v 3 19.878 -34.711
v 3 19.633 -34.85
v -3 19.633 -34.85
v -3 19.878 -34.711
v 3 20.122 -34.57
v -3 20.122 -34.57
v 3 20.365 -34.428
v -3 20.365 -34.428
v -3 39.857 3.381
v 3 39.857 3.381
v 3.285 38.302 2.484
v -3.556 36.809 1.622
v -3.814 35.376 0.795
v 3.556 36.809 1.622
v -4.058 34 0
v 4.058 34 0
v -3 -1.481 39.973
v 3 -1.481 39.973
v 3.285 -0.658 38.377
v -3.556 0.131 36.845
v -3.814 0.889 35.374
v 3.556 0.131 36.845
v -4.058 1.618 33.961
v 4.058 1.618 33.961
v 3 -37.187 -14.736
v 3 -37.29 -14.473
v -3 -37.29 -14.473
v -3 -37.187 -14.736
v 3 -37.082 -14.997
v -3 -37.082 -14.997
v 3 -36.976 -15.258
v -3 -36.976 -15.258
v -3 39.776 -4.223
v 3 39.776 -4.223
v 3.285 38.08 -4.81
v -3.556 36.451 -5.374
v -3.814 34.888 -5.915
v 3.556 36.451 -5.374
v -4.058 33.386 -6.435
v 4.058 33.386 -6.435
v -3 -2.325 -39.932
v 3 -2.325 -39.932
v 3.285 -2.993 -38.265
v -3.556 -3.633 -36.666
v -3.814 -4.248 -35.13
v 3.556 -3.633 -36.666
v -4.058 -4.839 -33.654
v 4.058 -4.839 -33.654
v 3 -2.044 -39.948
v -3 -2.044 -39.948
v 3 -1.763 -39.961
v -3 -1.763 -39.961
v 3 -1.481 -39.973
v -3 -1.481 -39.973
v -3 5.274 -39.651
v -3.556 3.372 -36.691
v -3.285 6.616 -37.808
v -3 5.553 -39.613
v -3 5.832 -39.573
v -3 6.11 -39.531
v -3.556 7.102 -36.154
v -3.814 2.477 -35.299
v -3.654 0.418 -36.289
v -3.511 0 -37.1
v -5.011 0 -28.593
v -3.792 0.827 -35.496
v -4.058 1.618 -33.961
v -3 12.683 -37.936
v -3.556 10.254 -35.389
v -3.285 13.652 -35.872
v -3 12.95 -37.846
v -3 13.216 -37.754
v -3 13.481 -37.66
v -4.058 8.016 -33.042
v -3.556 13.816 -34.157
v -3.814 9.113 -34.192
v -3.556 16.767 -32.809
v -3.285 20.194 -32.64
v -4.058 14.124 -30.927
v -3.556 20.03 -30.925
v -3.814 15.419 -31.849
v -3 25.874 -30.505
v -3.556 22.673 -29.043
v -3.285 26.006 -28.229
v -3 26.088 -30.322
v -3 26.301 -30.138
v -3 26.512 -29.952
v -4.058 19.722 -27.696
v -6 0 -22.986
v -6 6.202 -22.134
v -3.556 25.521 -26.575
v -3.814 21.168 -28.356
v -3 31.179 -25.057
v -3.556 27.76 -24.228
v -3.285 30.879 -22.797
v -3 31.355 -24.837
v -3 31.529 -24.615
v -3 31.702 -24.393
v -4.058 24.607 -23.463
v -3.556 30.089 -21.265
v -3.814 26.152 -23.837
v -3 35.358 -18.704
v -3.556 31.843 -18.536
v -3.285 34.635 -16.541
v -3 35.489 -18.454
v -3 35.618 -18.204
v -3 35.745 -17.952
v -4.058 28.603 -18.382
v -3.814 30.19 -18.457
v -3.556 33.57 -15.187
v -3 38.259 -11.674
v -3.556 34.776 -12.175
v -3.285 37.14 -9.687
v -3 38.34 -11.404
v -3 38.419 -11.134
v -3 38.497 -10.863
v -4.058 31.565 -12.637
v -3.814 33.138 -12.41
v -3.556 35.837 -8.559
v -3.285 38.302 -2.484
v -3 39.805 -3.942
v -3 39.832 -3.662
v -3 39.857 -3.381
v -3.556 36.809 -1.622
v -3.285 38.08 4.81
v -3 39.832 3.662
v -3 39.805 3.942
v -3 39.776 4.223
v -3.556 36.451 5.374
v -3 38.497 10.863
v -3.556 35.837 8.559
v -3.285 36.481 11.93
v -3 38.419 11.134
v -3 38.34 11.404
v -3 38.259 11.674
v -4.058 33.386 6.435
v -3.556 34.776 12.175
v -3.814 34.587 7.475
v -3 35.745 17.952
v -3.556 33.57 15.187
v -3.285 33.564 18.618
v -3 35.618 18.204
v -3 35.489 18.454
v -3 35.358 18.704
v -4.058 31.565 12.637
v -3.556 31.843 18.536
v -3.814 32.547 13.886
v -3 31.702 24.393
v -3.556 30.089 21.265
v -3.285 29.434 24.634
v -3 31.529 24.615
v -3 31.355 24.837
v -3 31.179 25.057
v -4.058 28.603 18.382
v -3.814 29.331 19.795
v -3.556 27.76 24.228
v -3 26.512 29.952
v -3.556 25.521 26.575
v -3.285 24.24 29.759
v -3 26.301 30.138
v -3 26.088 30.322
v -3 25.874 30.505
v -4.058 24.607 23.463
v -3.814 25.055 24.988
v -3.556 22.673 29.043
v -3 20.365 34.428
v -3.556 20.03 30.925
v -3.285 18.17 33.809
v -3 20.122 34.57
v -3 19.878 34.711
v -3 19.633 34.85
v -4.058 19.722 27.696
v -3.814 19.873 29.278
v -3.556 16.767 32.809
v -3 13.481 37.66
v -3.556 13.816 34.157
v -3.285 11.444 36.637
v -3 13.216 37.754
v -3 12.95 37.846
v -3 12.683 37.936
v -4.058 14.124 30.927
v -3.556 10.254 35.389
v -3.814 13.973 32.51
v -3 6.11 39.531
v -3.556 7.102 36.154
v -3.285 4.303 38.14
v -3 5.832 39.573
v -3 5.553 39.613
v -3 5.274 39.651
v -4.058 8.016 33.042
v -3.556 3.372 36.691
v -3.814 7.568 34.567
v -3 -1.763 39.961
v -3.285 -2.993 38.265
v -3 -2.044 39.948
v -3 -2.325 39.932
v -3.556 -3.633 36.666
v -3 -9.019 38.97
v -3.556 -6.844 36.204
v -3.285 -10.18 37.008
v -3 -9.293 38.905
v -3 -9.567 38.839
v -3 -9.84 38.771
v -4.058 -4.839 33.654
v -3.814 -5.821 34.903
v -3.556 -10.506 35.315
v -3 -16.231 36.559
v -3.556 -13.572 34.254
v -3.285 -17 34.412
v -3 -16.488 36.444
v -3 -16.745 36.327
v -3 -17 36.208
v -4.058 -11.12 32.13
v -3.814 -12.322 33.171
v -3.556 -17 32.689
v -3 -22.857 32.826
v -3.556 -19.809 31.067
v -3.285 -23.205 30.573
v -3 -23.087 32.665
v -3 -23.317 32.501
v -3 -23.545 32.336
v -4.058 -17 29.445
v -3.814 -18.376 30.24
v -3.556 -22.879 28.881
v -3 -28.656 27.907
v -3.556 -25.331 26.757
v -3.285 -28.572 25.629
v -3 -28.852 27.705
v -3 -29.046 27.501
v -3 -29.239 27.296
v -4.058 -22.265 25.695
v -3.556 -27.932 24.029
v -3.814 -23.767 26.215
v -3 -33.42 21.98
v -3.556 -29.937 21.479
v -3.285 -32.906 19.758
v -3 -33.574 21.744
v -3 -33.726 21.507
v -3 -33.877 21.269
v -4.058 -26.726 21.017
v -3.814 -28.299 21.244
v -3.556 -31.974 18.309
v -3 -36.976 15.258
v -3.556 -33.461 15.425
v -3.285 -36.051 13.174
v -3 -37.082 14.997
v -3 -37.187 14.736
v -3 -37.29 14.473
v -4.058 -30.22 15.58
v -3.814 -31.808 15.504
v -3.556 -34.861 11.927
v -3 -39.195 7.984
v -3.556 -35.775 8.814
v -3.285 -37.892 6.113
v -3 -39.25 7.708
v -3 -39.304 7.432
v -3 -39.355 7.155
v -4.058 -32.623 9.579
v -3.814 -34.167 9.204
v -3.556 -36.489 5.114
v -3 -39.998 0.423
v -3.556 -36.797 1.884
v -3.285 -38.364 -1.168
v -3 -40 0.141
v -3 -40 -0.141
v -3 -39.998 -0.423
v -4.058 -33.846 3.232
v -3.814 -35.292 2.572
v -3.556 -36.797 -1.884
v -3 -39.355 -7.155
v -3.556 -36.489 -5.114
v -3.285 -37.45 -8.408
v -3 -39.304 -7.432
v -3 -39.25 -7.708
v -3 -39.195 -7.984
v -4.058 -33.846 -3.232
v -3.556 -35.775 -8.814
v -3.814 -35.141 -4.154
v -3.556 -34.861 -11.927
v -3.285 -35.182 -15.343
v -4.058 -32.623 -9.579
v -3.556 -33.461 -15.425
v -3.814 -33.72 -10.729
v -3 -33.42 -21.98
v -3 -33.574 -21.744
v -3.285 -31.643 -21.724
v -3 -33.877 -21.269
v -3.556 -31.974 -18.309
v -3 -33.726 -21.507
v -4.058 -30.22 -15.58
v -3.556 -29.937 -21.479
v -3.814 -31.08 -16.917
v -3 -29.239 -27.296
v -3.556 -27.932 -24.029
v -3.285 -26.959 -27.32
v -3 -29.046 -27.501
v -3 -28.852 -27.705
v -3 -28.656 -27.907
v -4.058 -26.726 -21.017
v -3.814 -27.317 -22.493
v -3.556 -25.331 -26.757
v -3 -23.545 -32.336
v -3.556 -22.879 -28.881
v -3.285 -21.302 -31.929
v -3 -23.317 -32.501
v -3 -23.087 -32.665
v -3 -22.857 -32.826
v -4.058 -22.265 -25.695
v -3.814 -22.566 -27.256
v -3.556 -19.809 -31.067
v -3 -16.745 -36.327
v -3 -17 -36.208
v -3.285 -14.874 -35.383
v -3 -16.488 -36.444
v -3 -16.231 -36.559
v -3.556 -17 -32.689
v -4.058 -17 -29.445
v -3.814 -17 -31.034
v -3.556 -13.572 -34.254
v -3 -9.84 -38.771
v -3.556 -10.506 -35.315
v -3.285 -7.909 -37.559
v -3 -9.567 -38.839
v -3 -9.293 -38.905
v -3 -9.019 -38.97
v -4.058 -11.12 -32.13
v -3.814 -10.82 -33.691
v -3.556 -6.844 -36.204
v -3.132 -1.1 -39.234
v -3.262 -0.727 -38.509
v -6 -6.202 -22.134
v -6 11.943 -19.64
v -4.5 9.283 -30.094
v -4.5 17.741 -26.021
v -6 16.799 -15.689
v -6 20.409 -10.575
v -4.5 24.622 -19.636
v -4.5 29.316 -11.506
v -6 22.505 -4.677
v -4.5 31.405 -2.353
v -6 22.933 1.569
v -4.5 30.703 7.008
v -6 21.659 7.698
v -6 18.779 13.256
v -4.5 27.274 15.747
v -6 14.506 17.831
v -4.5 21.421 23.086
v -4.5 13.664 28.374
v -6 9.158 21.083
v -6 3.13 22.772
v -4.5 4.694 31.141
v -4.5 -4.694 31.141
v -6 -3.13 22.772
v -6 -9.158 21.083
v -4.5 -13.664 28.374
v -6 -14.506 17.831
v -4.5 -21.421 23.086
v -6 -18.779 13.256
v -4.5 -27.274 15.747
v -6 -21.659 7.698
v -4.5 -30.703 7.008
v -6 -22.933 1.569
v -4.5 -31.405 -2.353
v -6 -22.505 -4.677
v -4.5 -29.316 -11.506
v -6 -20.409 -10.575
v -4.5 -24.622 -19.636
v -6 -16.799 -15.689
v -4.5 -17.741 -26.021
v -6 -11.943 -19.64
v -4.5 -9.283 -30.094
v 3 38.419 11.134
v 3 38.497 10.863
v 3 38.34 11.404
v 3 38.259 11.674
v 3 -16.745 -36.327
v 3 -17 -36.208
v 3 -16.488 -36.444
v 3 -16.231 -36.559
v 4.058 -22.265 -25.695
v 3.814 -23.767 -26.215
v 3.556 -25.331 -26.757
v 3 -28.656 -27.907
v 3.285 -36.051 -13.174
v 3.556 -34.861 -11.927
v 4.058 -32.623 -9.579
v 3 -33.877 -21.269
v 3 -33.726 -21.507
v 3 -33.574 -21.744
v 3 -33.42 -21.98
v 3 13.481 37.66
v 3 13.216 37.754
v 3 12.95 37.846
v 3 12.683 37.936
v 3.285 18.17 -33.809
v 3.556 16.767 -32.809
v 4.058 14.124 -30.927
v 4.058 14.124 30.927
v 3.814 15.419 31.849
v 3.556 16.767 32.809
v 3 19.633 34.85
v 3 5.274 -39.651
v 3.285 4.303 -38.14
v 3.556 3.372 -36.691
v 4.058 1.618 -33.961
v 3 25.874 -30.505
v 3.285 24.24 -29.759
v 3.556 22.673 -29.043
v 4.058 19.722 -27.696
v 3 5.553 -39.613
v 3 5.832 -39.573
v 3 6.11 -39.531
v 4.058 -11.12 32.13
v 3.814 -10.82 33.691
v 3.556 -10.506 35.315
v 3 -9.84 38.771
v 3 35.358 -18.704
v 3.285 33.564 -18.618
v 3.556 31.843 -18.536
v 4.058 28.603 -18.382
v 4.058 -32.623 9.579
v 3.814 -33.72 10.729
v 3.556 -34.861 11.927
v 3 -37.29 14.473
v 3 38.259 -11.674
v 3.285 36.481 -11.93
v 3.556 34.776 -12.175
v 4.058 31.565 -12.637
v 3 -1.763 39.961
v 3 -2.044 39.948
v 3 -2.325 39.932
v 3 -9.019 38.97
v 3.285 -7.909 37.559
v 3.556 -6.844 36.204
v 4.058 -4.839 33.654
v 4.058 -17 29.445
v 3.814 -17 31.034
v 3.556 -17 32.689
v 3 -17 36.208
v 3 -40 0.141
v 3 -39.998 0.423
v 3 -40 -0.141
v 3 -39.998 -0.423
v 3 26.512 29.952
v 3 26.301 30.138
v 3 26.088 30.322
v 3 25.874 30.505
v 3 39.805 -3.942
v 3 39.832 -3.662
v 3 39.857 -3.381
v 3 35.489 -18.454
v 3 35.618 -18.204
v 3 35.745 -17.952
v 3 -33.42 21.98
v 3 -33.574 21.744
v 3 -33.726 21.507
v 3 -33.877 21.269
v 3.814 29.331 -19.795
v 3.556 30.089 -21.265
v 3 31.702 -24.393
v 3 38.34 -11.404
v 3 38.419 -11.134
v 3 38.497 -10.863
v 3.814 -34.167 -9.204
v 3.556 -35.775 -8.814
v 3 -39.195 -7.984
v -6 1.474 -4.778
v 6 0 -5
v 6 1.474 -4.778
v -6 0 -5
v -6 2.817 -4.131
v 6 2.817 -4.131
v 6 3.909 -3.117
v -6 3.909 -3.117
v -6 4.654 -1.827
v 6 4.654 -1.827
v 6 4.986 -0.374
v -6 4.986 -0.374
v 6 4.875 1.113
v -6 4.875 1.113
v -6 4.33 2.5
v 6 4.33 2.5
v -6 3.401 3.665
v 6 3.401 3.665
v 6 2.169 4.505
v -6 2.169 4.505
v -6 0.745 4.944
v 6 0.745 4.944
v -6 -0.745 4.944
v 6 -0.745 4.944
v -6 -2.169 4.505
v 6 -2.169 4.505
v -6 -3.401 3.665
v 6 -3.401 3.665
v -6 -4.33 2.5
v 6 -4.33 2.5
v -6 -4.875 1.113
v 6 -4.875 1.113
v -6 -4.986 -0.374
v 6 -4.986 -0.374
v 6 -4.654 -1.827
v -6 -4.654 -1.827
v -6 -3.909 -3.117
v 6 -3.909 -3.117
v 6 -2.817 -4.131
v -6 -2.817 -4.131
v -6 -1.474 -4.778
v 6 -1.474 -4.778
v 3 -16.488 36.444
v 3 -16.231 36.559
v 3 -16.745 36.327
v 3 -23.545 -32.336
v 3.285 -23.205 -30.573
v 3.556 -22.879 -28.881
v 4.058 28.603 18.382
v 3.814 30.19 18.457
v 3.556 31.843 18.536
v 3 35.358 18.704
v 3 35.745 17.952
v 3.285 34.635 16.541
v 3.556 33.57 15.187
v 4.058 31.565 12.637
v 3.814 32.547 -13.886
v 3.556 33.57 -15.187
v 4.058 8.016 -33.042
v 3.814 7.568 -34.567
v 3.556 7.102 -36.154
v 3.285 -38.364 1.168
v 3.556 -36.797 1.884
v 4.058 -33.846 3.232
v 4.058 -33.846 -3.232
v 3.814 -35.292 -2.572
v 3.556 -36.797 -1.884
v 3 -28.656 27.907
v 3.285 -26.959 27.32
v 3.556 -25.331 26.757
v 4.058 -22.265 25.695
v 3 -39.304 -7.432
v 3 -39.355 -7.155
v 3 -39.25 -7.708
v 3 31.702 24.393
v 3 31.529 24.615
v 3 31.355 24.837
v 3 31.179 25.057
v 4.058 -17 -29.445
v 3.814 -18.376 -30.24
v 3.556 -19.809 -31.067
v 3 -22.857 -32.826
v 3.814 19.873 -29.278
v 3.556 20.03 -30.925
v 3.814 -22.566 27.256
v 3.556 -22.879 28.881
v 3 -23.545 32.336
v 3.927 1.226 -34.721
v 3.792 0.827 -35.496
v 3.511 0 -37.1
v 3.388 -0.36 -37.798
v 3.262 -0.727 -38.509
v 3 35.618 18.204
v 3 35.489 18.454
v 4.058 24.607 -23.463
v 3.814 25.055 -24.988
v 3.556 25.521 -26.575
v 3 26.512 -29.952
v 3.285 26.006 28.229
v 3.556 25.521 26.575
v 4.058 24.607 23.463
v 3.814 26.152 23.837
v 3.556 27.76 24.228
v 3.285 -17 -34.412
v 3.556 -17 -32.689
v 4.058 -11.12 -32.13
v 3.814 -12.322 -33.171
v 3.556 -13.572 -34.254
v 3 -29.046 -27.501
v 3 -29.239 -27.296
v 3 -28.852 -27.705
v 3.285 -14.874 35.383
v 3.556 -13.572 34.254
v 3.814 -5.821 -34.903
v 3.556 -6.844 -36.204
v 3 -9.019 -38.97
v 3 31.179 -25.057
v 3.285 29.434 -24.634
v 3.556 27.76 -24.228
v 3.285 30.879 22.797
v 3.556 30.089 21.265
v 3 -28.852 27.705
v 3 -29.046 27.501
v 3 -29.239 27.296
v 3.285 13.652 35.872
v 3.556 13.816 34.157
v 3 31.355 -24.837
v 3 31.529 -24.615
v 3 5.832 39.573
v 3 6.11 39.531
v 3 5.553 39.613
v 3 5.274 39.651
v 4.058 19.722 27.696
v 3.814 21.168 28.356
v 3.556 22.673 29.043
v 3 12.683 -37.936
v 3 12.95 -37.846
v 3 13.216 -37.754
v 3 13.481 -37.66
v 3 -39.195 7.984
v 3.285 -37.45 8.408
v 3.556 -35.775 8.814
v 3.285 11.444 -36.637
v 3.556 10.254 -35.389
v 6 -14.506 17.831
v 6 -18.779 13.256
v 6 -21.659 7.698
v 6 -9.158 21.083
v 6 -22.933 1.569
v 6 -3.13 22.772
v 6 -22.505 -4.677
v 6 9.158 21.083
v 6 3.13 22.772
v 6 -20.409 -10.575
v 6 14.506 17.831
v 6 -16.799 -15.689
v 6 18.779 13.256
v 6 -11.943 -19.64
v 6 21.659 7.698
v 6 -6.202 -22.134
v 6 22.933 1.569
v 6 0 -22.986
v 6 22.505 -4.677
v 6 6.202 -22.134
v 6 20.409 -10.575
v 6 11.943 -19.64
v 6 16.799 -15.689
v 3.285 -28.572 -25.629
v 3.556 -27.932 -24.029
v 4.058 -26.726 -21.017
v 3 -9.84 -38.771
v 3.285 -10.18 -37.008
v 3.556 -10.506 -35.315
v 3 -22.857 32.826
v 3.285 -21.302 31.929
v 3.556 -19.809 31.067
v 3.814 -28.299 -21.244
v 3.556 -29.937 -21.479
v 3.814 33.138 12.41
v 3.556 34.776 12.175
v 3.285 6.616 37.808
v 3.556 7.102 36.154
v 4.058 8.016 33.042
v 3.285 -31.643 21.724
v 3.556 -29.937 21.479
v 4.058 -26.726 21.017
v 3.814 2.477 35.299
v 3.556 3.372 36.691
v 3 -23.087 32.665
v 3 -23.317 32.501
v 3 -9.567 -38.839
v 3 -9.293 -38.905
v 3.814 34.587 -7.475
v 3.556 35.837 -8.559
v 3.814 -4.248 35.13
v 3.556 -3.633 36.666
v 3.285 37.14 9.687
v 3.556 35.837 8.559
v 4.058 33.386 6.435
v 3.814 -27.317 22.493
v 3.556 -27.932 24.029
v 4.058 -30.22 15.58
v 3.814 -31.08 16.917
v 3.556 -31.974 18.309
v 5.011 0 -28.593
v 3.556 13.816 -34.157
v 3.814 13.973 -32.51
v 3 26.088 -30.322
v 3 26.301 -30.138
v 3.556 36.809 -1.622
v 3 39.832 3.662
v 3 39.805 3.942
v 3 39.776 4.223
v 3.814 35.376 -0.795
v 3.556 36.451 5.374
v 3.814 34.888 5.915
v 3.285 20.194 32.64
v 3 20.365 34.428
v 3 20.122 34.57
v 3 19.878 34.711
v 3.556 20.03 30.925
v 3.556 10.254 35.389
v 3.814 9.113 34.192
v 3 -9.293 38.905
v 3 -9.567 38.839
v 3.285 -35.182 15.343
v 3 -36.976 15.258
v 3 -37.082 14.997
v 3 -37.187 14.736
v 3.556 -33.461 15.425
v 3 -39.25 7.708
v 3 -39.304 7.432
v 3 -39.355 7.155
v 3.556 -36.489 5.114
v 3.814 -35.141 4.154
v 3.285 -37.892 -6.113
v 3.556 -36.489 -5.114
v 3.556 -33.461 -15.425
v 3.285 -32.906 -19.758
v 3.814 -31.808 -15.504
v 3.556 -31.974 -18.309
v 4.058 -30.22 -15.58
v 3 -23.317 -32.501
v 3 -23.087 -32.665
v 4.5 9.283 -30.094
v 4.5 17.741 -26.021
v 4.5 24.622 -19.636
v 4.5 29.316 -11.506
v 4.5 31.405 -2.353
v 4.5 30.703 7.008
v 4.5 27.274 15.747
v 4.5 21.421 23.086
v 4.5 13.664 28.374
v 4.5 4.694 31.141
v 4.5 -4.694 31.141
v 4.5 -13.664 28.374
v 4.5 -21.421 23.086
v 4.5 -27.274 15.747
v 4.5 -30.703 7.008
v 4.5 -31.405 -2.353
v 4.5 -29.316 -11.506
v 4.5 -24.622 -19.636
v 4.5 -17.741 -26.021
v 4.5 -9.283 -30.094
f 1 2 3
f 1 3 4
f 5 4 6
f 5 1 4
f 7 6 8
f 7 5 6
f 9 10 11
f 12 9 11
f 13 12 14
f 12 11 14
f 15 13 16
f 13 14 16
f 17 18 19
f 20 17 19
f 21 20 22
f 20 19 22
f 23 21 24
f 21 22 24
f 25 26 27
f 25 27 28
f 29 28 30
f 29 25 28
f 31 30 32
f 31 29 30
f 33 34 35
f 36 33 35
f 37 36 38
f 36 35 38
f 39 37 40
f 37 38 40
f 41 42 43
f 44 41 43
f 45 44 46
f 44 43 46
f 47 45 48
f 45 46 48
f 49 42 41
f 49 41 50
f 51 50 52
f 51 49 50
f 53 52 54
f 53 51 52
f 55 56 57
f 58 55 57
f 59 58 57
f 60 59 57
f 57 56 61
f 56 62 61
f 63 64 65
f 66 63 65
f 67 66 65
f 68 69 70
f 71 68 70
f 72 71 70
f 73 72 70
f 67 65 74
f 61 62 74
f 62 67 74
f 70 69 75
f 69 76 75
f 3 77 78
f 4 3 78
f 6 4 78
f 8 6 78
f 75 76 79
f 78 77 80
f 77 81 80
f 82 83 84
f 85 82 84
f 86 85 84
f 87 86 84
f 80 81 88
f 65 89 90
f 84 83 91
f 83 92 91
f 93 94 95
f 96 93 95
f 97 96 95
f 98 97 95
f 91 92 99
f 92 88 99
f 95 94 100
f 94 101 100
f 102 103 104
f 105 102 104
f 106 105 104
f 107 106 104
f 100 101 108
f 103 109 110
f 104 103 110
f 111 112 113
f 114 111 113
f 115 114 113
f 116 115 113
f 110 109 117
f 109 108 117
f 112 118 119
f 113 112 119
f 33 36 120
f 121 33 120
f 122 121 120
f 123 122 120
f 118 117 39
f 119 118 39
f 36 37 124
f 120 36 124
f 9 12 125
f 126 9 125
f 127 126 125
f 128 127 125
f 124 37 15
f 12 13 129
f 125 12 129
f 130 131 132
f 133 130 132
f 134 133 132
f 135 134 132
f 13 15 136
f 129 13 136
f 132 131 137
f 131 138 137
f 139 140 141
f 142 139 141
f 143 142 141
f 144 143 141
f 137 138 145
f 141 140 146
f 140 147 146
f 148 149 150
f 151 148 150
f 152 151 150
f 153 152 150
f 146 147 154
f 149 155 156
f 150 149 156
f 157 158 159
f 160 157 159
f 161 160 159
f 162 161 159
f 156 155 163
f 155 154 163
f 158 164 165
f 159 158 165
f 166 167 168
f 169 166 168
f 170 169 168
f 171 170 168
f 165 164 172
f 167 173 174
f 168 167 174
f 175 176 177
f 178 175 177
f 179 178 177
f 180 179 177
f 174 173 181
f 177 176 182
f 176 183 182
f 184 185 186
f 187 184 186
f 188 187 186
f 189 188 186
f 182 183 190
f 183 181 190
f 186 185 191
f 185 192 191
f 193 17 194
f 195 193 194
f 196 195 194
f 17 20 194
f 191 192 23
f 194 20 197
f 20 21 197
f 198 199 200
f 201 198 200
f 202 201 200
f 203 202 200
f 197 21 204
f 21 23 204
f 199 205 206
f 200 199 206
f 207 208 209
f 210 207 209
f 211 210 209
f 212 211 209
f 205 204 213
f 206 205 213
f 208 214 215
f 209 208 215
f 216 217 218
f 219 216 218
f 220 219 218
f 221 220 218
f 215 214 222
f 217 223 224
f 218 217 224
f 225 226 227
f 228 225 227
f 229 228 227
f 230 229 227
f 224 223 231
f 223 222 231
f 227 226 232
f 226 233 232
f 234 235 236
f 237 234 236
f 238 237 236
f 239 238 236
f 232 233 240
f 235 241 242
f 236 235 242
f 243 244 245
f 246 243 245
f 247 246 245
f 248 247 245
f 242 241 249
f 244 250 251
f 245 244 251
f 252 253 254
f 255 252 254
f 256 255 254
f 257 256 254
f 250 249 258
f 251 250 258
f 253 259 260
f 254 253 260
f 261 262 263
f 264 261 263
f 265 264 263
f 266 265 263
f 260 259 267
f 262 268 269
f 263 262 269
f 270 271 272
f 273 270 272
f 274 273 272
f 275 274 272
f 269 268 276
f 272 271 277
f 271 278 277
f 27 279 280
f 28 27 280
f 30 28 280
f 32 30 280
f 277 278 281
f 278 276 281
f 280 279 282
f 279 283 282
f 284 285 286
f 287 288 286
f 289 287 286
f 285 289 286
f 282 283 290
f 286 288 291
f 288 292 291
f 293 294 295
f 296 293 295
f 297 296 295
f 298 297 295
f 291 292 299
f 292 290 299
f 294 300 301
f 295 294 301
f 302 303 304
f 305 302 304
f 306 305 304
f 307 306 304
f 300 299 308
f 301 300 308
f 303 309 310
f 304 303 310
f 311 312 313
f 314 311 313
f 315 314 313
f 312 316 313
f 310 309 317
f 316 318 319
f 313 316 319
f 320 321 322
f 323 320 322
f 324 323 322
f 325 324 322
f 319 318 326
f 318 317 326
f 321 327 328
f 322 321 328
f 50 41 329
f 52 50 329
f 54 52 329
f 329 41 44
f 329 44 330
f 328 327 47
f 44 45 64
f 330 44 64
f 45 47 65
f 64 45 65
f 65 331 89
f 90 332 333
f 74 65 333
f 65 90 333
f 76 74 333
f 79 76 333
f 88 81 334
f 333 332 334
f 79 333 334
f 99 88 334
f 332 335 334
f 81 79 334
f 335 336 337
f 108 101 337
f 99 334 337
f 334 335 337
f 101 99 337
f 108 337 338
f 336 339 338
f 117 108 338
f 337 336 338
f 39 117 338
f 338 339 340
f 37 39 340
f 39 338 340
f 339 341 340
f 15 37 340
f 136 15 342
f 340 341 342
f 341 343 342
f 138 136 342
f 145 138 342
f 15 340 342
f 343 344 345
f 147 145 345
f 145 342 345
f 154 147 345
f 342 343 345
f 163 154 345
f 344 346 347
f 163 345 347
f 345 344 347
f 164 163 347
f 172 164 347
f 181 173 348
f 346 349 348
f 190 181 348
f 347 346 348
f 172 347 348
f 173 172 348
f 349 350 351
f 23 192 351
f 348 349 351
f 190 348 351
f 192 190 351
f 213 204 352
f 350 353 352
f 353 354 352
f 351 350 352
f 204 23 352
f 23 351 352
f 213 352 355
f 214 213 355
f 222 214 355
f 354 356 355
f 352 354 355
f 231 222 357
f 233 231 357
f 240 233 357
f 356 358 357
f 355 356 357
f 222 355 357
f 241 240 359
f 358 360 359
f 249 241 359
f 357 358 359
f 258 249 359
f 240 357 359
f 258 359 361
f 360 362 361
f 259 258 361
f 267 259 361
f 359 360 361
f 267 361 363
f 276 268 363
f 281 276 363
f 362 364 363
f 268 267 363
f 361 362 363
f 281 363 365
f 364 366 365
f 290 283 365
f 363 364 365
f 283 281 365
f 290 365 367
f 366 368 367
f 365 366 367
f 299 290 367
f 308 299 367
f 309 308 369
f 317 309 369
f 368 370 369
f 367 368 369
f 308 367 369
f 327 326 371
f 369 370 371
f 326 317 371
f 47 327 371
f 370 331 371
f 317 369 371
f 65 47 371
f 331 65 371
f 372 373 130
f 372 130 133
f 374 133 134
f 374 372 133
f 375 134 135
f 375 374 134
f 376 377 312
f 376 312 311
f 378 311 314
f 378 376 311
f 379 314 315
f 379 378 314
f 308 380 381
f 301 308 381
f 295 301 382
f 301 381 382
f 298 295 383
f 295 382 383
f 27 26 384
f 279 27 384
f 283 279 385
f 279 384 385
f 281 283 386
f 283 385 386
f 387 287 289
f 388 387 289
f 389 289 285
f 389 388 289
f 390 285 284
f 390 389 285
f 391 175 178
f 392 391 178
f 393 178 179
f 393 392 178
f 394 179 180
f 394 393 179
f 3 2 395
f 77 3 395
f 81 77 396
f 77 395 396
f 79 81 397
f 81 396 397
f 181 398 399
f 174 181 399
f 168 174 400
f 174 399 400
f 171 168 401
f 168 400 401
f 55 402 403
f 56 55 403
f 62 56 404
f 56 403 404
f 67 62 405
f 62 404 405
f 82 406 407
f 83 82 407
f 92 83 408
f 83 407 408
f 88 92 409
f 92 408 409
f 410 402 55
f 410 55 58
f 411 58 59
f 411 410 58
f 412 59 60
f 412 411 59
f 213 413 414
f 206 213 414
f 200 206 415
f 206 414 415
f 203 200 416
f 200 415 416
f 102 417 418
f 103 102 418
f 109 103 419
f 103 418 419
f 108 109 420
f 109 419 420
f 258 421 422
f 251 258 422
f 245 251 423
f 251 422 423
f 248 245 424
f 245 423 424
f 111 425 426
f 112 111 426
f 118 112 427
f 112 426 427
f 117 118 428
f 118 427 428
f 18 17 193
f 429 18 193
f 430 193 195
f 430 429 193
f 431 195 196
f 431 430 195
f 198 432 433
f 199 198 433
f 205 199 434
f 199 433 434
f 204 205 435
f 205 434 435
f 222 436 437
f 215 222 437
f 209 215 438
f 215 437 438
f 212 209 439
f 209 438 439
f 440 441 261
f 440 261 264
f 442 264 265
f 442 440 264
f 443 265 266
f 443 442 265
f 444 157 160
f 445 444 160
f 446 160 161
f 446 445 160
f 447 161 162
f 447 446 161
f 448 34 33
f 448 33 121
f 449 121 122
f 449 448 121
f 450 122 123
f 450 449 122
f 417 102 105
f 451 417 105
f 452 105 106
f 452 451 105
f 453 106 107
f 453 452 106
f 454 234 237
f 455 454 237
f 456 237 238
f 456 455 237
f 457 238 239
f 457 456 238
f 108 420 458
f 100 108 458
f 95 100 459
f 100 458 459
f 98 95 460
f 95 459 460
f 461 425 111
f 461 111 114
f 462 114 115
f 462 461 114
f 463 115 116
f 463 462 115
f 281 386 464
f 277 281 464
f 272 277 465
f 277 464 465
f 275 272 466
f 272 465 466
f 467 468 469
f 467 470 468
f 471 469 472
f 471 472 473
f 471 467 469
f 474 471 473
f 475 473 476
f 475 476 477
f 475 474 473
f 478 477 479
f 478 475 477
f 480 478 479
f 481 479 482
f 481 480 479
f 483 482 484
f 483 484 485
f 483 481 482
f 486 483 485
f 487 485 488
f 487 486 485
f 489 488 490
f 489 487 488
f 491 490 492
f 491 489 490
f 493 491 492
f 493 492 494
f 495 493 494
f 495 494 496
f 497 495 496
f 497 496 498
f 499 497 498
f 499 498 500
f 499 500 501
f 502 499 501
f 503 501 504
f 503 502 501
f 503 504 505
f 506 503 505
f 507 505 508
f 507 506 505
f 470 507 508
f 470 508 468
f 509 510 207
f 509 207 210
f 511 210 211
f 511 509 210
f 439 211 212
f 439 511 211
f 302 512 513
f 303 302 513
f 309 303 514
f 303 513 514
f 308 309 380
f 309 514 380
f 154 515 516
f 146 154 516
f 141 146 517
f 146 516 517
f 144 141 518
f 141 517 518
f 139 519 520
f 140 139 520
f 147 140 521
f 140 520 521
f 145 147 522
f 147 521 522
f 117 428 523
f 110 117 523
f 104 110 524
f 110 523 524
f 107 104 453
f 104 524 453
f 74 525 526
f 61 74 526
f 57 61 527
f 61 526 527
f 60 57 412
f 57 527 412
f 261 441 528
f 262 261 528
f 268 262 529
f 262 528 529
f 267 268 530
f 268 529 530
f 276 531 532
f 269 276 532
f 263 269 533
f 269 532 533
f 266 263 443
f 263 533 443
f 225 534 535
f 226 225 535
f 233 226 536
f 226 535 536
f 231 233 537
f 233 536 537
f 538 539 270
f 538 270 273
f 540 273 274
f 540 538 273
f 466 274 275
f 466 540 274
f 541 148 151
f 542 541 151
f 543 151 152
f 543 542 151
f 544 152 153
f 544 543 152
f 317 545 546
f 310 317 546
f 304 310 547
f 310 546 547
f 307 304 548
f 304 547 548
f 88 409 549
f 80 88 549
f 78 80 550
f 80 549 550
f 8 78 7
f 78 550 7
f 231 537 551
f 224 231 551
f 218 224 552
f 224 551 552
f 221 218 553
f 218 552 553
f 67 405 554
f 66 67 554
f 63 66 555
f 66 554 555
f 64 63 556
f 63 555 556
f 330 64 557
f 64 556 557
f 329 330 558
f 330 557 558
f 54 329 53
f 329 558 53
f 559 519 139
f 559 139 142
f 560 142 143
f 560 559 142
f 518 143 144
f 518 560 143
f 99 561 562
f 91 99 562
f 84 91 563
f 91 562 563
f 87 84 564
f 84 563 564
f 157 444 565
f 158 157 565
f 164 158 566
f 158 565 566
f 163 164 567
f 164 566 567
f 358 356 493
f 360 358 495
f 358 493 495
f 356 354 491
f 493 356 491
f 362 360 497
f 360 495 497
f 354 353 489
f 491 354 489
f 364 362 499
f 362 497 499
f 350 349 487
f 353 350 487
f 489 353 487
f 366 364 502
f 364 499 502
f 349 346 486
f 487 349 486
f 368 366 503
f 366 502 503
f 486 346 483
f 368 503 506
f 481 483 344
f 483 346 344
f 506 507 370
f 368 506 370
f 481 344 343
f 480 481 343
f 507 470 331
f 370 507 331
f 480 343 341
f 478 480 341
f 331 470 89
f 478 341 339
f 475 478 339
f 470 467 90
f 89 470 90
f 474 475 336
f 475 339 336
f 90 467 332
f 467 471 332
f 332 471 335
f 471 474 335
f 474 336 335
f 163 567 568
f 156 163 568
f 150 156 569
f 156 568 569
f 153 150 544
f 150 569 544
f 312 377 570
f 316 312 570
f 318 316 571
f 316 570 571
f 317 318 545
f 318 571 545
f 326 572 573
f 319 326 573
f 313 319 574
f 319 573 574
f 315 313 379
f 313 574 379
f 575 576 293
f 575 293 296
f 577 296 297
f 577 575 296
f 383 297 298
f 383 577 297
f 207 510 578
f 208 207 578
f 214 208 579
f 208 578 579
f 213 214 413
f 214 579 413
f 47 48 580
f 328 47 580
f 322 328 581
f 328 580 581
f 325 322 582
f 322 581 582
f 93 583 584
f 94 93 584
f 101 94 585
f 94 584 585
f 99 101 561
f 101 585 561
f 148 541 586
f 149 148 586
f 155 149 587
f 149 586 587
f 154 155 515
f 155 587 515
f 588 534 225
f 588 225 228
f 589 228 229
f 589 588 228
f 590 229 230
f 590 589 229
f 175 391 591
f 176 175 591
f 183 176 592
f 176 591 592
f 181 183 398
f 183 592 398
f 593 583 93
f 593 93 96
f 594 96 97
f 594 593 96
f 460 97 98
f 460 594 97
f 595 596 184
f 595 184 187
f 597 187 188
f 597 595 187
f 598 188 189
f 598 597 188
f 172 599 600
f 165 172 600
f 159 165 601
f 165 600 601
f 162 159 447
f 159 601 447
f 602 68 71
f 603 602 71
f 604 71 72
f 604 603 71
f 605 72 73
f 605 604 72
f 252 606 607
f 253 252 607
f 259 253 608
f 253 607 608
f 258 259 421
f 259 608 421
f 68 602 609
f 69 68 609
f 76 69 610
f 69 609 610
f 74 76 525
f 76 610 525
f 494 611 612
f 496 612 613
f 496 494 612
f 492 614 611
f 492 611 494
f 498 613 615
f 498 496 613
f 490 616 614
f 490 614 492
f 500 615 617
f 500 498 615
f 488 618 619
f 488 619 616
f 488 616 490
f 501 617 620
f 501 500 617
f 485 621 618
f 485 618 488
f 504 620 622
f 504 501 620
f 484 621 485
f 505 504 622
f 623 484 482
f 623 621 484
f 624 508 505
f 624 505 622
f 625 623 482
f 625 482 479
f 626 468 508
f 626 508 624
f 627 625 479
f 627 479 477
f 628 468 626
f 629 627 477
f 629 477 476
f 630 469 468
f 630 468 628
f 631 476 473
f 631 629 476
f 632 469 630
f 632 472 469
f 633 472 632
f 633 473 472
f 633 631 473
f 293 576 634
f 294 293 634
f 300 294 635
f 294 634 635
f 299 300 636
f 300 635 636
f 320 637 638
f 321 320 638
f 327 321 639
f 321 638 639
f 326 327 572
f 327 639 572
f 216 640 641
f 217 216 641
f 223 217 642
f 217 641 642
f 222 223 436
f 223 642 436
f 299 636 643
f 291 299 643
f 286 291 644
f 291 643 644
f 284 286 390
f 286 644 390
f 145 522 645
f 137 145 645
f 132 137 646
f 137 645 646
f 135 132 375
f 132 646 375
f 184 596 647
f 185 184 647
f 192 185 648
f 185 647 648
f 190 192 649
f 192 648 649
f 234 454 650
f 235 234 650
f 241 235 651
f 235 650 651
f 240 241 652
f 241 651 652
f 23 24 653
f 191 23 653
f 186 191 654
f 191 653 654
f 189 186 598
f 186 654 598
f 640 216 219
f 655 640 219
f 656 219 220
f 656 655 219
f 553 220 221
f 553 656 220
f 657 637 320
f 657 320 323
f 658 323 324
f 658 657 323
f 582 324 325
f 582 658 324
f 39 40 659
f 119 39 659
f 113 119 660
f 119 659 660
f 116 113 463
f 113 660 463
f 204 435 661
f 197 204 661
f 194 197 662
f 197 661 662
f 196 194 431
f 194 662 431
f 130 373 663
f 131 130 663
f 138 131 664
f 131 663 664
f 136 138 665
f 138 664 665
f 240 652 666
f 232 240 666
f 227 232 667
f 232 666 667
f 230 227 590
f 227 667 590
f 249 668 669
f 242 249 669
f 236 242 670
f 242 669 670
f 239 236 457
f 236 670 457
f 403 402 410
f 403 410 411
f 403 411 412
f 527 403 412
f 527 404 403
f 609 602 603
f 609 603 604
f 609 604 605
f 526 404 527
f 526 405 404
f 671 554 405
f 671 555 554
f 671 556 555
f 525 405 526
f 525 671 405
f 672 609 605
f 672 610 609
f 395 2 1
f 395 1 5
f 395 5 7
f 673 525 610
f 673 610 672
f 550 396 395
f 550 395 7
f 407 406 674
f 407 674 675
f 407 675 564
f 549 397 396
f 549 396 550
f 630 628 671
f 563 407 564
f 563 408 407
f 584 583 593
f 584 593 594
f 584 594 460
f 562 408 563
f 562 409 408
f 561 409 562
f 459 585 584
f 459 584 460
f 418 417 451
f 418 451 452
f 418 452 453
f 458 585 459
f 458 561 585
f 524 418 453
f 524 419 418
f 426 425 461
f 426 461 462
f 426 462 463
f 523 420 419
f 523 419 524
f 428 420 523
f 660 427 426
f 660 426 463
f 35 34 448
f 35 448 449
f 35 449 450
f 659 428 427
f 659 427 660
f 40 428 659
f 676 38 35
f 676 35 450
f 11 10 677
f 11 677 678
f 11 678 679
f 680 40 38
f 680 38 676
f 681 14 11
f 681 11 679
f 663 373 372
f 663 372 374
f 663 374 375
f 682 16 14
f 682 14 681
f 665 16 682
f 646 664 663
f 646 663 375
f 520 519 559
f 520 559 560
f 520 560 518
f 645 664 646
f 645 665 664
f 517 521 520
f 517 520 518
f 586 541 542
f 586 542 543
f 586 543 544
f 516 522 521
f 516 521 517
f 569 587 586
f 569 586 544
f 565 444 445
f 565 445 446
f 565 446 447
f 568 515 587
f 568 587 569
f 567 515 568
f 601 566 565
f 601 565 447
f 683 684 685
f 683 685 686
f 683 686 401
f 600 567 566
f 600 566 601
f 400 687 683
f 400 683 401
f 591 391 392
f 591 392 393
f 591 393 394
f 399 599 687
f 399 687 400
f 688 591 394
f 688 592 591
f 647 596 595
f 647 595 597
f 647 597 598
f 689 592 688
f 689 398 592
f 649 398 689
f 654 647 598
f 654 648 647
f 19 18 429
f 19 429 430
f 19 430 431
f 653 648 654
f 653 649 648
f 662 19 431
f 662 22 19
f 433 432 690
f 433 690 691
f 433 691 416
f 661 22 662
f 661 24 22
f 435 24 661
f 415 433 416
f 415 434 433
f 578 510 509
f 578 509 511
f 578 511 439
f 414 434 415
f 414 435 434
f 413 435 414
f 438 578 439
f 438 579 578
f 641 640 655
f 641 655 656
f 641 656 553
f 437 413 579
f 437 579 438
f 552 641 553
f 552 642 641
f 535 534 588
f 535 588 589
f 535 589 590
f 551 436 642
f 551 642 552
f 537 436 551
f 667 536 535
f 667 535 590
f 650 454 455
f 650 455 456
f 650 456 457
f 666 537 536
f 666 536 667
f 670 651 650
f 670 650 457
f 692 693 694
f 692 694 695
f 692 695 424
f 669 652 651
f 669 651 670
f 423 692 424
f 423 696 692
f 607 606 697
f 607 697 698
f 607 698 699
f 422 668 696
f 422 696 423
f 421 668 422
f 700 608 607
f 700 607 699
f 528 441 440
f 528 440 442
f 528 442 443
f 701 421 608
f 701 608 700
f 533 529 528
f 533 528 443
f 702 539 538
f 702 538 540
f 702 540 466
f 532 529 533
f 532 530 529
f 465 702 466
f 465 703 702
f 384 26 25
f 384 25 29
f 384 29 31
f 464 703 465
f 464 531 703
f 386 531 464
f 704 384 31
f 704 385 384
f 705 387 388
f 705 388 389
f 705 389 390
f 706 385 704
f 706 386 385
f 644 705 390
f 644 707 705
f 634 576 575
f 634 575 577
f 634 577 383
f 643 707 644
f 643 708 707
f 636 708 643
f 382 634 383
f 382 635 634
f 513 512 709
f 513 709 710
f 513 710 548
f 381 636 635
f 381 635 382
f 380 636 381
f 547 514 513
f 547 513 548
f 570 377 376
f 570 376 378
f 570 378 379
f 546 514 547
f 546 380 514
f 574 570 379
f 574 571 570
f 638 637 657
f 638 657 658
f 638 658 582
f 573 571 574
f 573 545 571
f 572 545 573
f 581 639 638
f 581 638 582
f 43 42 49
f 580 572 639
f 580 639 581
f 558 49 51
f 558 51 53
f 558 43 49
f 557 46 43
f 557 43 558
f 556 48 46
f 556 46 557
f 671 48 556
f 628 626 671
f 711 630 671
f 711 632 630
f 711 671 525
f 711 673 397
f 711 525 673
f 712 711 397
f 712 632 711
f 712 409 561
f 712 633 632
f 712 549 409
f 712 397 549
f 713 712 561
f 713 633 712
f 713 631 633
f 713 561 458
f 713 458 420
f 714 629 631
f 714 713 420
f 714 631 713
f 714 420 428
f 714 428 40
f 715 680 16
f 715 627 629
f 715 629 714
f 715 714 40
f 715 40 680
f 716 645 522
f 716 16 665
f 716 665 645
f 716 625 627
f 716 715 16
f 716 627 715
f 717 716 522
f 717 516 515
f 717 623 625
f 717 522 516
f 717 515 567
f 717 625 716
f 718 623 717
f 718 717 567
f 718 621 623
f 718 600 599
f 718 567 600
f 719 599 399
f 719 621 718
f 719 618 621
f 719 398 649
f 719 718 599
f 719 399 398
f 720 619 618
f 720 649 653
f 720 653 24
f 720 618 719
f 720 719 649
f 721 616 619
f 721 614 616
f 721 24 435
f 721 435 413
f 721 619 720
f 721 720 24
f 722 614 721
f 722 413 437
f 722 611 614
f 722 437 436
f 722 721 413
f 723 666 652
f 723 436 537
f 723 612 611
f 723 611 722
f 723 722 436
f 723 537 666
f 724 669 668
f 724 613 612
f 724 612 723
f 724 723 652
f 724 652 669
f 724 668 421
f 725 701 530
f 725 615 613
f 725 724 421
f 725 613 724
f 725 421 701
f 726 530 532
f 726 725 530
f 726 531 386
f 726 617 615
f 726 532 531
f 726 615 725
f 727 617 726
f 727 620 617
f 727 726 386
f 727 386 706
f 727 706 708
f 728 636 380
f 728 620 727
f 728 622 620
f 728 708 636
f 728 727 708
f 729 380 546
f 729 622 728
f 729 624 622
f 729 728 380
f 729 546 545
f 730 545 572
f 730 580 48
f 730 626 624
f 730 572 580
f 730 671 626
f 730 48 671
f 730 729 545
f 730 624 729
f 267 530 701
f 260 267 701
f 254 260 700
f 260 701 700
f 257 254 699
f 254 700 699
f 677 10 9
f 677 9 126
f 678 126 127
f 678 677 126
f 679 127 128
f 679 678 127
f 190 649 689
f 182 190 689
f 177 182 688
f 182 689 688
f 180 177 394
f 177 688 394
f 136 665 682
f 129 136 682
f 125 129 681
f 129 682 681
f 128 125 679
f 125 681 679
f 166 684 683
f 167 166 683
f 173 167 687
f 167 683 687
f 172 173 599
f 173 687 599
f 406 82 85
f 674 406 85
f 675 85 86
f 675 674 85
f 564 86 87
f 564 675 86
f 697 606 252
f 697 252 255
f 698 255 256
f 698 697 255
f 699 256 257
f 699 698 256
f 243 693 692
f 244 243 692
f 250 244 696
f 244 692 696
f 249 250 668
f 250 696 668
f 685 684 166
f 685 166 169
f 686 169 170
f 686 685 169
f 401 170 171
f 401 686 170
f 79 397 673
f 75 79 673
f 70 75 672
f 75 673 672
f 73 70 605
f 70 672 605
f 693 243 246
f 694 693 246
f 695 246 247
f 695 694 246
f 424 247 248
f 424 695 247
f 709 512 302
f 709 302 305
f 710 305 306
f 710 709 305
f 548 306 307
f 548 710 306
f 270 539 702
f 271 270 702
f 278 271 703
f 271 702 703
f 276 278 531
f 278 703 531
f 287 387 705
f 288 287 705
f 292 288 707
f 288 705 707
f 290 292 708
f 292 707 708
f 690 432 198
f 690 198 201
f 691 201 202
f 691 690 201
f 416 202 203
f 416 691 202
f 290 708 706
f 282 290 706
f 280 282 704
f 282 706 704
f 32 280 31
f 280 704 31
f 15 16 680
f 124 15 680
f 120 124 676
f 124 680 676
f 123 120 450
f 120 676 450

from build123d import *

# Parameters (mm, degrees)
SKETCH1_R           = 40
SKETCH1_R_2         = 5
BOSS_EXTRUDE1_DEPTH = 6
CHAMFER2_SIZE       = 3
CHAMFER2_SIZE2      = 17.013845459
CHAMFER3_SIZE       = 3
CHAMFER3_SIZE2      = 17.013845459
CUT_EXTRUDE2_DEPTH  = 12
CIRPATTERN2_COUNT   = 33


with BuildPart() as part:
    # Sketch1 → Boss-Extrude1 (new body, symmetric)
    with BuildSketch(Plane(origin=(0, 0, 0), x_dir=(0, 0, -1), z_dir=(1, 0, 0))):
        Circle(SKETCH1_R)
        Circle(SKETCH1_R_2, mode=Mode.SUBTRACT)
    extrude(amount=BOSS_EXTRUDE1_DEPTH, both=True)

    # Chamfer2
    chamfer2_edges = [part.edges().sort_by_distance(p)[0] for p in [
        (6, 0, 40),
    ]]
    chamfer2_side = [part.faces().sort_by_distance(p)[0] for p in [
        (0, 0, 40),
    ]]
    chamfer(chamfer2_edges, length=CHAMFER2_SIZE, length2=CHAMFER2_SIZE2, reference=chamfer2_side[0])

    # Chamfer3
    chamfer3_edges = [part.edges().sort_by_distance(p)[0] for p in [
        (-6, 0, 40),
    ]]
    chamfer3_side = [part.faces().sort_by_distance(p)[0] for p in [
        (-1.5, 0, 40),
    ]]
    chamfer(chamfer3_edges, length=CHAMFER3_SIZE, length2=CHAMFER3_SIZE2, reference=chamfer3_side[0])

    # Sketch2 → Cut-Extrude2 (cut)
    with BuildSketch(Plane(origin=(6, 0, 0), x_dir=(0, 0, -1), z_dir=(1, 0, 0))):
        with BuildLine():
            Line((0, 34), (3.381435126, 39.856817441))
            ThreePointArc((3.381435126, 39.856817441), (0, 40.762870252), (-3.381435126, 39.856817441))
            Line((-3.381435126, 39.856817441), (0, 34))
        make_face()
    cut_extrude2 = extrude(amount=-CUT_EXTRUDE2_DEPTH, mode=Mode.SUBTRACT)

    # CirPattern2: Cut-Extrude2 ×33 about axis
    cirpattern2_axis = Axis((0, 0, 0), (1, 0, 0))
    for i in range(1, CIRPATTERN2_COUNT):
        add(cut_extrude2.rotate(cirpattern2_axis, i * 360 / CIRPATTERN2_COUNT), mode=Mode.SUBTRACT)


solid = part.part
